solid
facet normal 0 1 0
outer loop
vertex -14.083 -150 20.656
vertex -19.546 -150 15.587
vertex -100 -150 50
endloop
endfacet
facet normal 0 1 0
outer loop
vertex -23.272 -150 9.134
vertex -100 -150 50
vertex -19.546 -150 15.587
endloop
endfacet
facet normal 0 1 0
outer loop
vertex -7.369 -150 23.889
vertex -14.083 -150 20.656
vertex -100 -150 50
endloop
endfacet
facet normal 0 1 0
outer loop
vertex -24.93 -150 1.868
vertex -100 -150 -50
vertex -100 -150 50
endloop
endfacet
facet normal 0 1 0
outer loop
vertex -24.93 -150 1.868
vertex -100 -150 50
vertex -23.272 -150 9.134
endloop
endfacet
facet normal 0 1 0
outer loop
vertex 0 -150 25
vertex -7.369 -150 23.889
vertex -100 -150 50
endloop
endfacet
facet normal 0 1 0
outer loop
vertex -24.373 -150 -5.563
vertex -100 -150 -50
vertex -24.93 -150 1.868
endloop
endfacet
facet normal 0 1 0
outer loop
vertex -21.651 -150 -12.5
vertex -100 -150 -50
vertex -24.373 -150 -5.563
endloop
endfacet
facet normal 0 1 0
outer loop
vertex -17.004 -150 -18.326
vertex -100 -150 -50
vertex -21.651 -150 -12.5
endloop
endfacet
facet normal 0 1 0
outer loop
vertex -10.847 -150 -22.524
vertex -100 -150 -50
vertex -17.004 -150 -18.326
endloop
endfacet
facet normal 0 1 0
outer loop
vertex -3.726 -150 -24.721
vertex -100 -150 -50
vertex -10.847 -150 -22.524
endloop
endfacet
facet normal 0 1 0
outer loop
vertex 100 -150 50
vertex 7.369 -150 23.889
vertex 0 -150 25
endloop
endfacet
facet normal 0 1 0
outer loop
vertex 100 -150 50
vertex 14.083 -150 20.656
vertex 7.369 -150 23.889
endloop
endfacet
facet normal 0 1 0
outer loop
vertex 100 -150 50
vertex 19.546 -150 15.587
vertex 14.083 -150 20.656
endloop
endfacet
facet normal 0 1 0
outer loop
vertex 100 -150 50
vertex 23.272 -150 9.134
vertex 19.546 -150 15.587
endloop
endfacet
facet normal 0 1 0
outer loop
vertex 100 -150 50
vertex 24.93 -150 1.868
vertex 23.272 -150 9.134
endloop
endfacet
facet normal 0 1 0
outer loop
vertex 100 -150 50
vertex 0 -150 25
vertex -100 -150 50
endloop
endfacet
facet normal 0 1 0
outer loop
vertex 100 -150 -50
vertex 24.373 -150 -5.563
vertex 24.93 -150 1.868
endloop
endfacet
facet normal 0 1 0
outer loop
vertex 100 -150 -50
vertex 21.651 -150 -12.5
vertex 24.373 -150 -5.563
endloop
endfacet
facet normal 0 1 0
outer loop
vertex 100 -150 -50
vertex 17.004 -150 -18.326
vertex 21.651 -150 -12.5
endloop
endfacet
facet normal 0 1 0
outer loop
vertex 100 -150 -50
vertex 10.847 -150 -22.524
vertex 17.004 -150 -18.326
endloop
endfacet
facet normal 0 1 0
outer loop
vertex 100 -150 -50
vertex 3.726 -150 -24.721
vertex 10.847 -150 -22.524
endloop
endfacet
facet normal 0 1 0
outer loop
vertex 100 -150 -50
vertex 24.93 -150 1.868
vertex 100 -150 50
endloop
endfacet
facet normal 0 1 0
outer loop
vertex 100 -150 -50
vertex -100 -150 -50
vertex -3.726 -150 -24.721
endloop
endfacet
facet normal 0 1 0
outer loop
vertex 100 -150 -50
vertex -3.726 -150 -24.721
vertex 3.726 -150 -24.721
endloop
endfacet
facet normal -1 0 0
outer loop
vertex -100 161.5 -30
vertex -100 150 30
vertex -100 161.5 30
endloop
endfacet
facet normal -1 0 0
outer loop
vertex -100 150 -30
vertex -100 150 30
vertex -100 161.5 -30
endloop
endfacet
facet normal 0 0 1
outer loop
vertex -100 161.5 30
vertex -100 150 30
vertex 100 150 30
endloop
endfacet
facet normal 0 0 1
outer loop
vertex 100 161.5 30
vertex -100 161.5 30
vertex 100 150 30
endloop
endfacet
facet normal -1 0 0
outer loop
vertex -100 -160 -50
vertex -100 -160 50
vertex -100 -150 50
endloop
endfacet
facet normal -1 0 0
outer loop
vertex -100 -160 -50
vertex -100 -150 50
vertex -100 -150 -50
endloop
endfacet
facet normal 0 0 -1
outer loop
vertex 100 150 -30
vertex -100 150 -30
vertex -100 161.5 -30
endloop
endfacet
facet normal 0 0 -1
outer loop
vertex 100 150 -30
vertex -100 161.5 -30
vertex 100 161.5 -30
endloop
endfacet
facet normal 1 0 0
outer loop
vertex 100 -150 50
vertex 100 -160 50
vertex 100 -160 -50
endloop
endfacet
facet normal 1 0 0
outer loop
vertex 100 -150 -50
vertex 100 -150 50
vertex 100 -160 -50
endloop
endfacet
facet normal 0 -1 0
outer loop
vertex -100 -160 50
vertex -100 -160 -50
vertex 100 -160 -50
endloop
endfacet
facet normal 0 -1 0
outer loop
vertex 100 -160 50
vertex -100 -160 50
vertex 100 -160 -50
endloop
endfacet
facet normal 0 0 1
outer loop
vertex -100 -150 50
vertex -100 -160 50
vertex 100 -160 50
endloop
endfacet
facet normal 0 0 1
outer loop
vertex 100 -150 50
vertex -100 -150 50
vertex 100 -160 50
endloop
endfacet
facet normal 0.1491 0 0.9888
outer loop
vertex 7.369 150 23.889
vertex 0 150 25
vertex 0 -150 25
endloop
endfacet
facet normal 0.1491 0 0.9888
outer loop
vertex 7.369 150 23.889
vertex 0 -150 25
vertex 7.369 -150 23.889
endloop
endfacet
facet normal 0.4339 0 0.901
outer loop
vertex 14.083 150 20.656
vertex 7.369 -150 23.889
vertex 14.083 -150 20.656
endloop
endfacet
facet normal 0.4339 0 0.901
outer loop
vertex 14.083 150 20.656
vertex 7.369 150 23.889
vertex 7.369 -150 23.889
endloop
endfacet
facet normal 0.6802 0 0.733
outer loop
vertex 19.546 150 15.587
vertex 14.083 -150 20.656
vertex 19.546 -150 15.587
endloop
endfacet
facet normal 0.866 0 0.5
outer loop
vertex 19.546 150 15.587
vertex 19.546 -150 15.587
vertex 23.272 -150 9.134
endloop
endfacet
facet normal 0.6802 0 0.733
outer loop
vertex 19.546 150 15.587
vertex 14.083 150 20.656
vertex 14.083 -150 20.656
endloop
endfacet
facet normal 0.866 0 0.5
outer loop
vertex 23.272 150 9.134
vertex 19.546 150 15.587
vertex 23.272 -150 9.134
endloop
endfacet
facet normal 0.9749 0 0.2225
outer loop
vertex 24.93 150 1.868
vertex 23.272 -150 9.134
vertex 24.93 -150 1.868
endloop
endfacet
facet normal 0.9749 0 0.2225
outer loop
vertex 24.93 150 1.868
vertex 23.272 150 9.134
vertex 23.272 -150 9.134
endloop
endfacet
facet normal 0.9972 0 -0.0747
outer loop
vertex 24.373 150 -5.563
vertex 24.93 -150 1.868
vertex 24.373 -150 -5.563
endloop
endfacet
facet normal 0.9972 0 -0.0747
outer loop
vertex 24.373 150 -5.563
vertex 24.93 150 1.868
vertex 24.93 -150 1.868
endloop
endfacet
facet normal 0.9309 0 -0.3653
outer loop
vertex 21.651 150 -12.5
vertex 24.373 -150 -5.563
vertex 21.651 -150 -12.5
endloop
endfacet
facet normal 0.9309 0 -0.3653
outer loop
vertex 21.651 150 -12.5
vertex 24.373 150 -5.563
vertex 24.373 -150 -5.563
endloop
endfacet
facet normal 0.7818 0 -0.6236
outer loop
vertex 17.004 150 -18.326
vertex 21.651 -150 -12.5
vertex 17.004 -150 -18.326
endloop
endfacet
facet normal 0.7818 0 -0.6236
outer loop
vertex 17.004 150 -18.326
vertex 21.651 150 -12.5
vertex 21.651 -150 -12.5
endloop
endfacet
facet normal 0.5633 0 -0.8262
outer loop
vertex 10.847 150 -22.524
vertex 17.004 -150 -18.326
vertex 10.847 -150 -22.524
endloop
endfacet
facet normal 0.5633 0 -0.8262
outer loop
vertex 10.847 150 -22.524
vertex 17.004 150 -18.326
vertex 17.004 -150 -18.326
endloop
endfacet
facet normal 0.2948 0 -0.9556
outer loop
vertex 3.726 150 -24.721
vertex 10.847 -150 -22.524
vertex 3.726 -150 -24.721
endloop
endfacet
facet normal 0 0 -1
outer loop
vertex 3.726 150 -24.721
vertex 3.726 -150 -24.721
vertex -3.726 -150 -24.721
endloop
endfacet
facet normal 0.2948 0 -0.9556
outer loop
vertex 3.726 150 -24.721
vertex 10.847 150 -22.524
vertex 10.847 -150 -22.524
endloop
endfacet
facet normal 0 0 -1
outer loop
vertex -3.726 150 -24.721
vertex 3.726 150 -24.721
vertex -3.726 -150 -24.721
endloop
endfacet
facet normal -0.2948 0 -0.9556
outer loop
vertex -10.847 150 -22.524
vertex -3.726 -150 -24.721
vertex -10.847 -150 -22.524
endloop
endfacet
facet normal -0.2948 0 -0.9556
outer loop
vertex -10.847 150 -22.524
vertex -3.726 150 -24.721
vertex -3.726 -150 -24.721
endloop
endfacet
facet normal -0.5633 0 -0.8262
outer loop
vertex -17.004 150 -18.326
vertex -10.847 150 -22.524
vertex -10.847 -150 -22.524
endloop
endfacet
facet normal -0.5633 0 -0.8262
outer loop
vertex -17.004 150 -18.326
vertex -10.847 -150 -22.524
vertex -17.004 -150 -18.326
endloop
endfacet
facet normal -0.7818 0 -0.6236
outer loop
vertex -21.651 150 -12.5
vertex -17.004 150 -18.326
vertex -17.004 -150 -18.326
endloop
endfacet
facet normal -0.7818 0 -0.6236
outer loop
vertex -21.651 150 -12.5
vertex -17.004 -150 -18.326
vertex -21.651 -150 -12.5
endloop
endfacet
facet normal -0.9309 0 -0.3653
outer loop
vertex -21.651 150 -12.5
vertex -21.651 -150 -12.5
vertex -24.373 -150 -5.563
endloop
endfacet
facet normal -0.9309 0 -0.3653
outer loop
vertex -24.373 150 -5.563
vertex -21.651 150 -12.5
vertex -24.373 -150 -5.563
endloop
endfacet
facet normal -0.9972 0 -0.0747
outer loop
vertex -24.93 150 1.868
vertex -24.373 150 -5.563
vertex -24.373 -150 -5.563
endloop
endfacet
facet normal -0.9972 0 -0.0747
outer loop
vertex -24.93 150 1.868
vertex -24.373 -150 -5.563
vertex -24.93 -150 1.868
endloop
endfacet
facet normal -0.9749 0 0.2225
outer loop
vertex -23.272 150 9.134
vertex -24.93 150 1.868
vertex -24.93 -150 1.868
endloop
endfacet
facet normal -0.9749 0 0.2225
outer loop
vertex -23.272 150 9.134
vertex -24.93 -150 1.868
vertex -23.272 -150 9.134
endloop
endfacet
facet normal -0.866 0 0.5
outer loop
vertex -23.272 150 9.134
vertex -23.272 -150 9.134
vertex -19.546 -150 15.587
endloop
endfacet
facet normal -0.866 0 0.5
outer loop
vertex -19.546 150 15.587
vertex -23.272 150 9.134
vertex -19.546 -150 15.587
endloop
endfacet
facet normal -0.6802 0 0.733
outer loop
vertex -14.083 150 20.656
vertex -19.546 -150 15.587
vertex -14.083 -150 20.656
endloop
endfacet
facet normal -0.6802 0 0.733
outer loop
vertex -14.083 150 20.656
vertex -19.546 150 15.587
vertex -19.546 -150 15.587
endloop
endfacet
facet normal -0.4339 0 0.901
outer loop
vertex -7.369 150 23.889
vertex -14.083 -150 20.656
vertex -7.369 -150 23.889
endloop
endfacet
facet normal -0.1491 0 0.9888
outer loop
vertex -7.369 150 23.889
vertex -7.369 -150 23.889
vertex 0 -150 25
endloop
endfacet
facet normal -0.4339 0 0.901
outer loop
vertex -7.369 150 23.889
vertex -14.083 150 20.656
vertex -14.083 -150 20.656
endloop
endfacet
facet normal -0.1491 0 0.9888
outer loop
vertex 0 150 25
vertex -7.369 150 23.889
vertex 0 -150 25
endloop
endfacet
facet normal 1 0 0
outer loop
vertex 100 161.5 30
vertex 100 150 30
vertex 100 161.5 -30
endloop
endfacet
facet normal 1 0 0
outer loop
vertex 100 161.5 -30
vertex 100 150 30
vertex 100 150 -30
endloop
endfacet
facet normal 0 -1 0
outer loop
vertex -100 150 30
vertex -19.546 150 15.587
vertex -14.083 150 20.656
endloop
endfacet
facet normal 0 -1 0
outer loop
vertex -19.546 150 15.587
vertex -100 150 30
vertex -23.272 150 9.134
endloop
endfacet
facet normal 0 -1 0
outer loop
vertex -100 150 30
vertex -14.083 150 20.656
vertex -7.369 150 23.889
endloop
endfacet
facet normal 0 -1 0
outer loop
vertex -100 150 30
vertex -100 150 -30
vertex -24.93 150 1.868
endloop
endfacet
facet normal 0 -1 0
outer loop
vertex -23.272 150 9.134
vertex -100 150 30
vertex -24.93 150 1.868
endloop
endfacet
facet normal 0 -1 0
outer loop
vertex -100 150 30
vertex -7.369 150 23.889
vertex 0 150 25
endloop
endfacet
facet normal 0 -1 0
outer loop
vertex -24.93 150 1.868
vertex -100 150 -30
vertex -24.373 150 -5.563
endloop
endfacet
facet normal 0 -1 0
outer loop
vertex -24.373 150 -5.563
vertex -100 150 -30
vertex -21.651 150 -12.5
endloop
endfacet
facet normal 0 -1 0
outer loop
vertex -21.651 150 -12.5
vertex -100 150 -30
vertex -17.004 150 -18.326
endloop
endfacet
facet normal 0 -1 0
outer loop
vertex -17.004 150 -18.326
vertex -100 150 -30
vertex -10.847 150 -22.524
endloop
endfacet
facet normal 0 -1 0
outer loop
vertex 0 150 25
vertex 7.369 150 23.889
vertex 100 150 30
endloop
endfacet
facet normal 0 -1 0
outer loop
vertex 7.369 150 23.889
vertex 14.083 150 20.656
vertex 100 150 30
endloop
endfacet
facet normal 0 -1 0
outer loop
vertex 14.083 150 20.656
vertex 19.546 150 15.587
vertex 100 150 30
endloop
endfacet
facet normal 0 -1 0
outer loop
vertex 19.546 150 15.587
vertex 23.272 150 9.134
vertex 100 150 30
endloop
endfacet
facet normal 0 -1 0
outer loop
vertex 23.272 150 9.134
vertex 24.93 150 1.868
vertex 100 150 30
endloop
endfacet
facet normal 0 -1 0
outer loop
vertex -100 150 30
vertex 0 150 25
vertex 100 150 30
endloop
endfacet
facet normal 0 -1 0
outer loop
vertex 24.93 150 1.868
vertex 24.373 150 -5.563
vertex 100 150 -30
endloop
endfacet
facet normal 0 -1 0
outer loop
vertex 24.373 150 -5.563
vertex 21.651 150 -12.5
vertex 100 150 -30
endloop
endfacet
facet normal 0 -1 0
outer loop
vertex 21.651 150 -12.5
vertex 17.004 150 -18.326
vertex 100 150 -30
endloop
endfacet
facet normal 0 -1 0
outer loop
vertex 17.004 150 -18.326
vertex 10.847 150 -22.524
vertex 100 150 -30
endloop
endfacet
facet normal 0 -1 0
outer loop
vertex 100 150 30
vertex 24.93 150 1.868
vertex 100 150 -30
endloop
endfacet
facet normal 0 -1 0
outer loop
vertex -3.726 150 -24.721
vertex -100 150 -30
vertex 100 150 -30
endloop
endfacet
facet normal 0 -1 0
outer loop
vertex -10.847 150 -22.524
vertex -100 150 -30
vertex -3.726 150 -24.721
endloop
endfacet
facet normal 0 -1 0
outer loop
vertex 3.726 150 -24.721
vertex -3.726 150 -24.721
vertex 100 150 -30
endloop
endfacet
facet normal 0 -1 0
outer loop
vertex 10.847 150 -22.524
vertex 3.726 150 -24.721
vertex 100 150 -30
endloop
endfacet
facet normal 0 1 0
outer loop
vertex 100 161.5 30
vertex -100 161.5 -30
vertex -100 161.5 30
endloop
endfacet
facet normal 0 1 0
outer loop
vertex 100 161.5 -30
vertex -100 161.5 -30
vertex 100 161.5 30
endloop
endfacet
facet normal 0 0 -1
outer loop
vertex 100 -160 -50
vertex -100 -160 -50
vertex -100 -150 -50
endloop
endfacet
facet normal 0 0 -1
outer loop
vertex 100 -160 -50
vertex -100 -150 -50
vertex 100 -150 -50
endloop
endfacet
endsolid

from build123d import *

# Parameters (mm, degrees)
BASE_START       = -160
SKETCH_6_W       = 200
SKETCH_6_H       = 100
BASE_PLATE_DEPTH = 10
POST_START       = 150
SKETCH_7_R       = 25
POST_DEPTH       = 300
TOP_START        = 150
SKETCH_8_W       = 200
SKETCH_8_H       = 60
TOP_PLATE_DEPTH  = 11.5


with BuildPart() as part:
    # 草图6 → Base Plate (new body)
    with BuildSketch(Plane(origin=(0, 0, 0), x_dir=(1, 0, 0), z_dir=(0, 1, 0)).offset(BASE_START)):
        Rectangle(SKETCH_6_W, SKETCH_6_H)
    extrude(amount=BASE_PLATE_DEPTH)

    # 草图7 → Post (add)
    with BuildSketch(Plane(origin=(0, 0, 0), x_dir=(1, 0, 0), z_dir=(0, 1, 0)).offset(POST_START)):
        with Locations(Location((0, 0, 0), (0, 0, 270))):
            Circle(SKETCH_7_R)
    extrude(amount=-POST_DEPTH)

    # 草图8 → Top Plate (add)
    with BuildSketch(Plane(origin=(0, 0, 0), x_dir=(1, 0, 0), z_dir=(0, 1, 0)).offset(TOP_START)):
        Rectangle(SKETCH_8_W, SKETCH_8_H)
    extrude(amount=TOP_PLATE_DEPTH)


solid = part.part
